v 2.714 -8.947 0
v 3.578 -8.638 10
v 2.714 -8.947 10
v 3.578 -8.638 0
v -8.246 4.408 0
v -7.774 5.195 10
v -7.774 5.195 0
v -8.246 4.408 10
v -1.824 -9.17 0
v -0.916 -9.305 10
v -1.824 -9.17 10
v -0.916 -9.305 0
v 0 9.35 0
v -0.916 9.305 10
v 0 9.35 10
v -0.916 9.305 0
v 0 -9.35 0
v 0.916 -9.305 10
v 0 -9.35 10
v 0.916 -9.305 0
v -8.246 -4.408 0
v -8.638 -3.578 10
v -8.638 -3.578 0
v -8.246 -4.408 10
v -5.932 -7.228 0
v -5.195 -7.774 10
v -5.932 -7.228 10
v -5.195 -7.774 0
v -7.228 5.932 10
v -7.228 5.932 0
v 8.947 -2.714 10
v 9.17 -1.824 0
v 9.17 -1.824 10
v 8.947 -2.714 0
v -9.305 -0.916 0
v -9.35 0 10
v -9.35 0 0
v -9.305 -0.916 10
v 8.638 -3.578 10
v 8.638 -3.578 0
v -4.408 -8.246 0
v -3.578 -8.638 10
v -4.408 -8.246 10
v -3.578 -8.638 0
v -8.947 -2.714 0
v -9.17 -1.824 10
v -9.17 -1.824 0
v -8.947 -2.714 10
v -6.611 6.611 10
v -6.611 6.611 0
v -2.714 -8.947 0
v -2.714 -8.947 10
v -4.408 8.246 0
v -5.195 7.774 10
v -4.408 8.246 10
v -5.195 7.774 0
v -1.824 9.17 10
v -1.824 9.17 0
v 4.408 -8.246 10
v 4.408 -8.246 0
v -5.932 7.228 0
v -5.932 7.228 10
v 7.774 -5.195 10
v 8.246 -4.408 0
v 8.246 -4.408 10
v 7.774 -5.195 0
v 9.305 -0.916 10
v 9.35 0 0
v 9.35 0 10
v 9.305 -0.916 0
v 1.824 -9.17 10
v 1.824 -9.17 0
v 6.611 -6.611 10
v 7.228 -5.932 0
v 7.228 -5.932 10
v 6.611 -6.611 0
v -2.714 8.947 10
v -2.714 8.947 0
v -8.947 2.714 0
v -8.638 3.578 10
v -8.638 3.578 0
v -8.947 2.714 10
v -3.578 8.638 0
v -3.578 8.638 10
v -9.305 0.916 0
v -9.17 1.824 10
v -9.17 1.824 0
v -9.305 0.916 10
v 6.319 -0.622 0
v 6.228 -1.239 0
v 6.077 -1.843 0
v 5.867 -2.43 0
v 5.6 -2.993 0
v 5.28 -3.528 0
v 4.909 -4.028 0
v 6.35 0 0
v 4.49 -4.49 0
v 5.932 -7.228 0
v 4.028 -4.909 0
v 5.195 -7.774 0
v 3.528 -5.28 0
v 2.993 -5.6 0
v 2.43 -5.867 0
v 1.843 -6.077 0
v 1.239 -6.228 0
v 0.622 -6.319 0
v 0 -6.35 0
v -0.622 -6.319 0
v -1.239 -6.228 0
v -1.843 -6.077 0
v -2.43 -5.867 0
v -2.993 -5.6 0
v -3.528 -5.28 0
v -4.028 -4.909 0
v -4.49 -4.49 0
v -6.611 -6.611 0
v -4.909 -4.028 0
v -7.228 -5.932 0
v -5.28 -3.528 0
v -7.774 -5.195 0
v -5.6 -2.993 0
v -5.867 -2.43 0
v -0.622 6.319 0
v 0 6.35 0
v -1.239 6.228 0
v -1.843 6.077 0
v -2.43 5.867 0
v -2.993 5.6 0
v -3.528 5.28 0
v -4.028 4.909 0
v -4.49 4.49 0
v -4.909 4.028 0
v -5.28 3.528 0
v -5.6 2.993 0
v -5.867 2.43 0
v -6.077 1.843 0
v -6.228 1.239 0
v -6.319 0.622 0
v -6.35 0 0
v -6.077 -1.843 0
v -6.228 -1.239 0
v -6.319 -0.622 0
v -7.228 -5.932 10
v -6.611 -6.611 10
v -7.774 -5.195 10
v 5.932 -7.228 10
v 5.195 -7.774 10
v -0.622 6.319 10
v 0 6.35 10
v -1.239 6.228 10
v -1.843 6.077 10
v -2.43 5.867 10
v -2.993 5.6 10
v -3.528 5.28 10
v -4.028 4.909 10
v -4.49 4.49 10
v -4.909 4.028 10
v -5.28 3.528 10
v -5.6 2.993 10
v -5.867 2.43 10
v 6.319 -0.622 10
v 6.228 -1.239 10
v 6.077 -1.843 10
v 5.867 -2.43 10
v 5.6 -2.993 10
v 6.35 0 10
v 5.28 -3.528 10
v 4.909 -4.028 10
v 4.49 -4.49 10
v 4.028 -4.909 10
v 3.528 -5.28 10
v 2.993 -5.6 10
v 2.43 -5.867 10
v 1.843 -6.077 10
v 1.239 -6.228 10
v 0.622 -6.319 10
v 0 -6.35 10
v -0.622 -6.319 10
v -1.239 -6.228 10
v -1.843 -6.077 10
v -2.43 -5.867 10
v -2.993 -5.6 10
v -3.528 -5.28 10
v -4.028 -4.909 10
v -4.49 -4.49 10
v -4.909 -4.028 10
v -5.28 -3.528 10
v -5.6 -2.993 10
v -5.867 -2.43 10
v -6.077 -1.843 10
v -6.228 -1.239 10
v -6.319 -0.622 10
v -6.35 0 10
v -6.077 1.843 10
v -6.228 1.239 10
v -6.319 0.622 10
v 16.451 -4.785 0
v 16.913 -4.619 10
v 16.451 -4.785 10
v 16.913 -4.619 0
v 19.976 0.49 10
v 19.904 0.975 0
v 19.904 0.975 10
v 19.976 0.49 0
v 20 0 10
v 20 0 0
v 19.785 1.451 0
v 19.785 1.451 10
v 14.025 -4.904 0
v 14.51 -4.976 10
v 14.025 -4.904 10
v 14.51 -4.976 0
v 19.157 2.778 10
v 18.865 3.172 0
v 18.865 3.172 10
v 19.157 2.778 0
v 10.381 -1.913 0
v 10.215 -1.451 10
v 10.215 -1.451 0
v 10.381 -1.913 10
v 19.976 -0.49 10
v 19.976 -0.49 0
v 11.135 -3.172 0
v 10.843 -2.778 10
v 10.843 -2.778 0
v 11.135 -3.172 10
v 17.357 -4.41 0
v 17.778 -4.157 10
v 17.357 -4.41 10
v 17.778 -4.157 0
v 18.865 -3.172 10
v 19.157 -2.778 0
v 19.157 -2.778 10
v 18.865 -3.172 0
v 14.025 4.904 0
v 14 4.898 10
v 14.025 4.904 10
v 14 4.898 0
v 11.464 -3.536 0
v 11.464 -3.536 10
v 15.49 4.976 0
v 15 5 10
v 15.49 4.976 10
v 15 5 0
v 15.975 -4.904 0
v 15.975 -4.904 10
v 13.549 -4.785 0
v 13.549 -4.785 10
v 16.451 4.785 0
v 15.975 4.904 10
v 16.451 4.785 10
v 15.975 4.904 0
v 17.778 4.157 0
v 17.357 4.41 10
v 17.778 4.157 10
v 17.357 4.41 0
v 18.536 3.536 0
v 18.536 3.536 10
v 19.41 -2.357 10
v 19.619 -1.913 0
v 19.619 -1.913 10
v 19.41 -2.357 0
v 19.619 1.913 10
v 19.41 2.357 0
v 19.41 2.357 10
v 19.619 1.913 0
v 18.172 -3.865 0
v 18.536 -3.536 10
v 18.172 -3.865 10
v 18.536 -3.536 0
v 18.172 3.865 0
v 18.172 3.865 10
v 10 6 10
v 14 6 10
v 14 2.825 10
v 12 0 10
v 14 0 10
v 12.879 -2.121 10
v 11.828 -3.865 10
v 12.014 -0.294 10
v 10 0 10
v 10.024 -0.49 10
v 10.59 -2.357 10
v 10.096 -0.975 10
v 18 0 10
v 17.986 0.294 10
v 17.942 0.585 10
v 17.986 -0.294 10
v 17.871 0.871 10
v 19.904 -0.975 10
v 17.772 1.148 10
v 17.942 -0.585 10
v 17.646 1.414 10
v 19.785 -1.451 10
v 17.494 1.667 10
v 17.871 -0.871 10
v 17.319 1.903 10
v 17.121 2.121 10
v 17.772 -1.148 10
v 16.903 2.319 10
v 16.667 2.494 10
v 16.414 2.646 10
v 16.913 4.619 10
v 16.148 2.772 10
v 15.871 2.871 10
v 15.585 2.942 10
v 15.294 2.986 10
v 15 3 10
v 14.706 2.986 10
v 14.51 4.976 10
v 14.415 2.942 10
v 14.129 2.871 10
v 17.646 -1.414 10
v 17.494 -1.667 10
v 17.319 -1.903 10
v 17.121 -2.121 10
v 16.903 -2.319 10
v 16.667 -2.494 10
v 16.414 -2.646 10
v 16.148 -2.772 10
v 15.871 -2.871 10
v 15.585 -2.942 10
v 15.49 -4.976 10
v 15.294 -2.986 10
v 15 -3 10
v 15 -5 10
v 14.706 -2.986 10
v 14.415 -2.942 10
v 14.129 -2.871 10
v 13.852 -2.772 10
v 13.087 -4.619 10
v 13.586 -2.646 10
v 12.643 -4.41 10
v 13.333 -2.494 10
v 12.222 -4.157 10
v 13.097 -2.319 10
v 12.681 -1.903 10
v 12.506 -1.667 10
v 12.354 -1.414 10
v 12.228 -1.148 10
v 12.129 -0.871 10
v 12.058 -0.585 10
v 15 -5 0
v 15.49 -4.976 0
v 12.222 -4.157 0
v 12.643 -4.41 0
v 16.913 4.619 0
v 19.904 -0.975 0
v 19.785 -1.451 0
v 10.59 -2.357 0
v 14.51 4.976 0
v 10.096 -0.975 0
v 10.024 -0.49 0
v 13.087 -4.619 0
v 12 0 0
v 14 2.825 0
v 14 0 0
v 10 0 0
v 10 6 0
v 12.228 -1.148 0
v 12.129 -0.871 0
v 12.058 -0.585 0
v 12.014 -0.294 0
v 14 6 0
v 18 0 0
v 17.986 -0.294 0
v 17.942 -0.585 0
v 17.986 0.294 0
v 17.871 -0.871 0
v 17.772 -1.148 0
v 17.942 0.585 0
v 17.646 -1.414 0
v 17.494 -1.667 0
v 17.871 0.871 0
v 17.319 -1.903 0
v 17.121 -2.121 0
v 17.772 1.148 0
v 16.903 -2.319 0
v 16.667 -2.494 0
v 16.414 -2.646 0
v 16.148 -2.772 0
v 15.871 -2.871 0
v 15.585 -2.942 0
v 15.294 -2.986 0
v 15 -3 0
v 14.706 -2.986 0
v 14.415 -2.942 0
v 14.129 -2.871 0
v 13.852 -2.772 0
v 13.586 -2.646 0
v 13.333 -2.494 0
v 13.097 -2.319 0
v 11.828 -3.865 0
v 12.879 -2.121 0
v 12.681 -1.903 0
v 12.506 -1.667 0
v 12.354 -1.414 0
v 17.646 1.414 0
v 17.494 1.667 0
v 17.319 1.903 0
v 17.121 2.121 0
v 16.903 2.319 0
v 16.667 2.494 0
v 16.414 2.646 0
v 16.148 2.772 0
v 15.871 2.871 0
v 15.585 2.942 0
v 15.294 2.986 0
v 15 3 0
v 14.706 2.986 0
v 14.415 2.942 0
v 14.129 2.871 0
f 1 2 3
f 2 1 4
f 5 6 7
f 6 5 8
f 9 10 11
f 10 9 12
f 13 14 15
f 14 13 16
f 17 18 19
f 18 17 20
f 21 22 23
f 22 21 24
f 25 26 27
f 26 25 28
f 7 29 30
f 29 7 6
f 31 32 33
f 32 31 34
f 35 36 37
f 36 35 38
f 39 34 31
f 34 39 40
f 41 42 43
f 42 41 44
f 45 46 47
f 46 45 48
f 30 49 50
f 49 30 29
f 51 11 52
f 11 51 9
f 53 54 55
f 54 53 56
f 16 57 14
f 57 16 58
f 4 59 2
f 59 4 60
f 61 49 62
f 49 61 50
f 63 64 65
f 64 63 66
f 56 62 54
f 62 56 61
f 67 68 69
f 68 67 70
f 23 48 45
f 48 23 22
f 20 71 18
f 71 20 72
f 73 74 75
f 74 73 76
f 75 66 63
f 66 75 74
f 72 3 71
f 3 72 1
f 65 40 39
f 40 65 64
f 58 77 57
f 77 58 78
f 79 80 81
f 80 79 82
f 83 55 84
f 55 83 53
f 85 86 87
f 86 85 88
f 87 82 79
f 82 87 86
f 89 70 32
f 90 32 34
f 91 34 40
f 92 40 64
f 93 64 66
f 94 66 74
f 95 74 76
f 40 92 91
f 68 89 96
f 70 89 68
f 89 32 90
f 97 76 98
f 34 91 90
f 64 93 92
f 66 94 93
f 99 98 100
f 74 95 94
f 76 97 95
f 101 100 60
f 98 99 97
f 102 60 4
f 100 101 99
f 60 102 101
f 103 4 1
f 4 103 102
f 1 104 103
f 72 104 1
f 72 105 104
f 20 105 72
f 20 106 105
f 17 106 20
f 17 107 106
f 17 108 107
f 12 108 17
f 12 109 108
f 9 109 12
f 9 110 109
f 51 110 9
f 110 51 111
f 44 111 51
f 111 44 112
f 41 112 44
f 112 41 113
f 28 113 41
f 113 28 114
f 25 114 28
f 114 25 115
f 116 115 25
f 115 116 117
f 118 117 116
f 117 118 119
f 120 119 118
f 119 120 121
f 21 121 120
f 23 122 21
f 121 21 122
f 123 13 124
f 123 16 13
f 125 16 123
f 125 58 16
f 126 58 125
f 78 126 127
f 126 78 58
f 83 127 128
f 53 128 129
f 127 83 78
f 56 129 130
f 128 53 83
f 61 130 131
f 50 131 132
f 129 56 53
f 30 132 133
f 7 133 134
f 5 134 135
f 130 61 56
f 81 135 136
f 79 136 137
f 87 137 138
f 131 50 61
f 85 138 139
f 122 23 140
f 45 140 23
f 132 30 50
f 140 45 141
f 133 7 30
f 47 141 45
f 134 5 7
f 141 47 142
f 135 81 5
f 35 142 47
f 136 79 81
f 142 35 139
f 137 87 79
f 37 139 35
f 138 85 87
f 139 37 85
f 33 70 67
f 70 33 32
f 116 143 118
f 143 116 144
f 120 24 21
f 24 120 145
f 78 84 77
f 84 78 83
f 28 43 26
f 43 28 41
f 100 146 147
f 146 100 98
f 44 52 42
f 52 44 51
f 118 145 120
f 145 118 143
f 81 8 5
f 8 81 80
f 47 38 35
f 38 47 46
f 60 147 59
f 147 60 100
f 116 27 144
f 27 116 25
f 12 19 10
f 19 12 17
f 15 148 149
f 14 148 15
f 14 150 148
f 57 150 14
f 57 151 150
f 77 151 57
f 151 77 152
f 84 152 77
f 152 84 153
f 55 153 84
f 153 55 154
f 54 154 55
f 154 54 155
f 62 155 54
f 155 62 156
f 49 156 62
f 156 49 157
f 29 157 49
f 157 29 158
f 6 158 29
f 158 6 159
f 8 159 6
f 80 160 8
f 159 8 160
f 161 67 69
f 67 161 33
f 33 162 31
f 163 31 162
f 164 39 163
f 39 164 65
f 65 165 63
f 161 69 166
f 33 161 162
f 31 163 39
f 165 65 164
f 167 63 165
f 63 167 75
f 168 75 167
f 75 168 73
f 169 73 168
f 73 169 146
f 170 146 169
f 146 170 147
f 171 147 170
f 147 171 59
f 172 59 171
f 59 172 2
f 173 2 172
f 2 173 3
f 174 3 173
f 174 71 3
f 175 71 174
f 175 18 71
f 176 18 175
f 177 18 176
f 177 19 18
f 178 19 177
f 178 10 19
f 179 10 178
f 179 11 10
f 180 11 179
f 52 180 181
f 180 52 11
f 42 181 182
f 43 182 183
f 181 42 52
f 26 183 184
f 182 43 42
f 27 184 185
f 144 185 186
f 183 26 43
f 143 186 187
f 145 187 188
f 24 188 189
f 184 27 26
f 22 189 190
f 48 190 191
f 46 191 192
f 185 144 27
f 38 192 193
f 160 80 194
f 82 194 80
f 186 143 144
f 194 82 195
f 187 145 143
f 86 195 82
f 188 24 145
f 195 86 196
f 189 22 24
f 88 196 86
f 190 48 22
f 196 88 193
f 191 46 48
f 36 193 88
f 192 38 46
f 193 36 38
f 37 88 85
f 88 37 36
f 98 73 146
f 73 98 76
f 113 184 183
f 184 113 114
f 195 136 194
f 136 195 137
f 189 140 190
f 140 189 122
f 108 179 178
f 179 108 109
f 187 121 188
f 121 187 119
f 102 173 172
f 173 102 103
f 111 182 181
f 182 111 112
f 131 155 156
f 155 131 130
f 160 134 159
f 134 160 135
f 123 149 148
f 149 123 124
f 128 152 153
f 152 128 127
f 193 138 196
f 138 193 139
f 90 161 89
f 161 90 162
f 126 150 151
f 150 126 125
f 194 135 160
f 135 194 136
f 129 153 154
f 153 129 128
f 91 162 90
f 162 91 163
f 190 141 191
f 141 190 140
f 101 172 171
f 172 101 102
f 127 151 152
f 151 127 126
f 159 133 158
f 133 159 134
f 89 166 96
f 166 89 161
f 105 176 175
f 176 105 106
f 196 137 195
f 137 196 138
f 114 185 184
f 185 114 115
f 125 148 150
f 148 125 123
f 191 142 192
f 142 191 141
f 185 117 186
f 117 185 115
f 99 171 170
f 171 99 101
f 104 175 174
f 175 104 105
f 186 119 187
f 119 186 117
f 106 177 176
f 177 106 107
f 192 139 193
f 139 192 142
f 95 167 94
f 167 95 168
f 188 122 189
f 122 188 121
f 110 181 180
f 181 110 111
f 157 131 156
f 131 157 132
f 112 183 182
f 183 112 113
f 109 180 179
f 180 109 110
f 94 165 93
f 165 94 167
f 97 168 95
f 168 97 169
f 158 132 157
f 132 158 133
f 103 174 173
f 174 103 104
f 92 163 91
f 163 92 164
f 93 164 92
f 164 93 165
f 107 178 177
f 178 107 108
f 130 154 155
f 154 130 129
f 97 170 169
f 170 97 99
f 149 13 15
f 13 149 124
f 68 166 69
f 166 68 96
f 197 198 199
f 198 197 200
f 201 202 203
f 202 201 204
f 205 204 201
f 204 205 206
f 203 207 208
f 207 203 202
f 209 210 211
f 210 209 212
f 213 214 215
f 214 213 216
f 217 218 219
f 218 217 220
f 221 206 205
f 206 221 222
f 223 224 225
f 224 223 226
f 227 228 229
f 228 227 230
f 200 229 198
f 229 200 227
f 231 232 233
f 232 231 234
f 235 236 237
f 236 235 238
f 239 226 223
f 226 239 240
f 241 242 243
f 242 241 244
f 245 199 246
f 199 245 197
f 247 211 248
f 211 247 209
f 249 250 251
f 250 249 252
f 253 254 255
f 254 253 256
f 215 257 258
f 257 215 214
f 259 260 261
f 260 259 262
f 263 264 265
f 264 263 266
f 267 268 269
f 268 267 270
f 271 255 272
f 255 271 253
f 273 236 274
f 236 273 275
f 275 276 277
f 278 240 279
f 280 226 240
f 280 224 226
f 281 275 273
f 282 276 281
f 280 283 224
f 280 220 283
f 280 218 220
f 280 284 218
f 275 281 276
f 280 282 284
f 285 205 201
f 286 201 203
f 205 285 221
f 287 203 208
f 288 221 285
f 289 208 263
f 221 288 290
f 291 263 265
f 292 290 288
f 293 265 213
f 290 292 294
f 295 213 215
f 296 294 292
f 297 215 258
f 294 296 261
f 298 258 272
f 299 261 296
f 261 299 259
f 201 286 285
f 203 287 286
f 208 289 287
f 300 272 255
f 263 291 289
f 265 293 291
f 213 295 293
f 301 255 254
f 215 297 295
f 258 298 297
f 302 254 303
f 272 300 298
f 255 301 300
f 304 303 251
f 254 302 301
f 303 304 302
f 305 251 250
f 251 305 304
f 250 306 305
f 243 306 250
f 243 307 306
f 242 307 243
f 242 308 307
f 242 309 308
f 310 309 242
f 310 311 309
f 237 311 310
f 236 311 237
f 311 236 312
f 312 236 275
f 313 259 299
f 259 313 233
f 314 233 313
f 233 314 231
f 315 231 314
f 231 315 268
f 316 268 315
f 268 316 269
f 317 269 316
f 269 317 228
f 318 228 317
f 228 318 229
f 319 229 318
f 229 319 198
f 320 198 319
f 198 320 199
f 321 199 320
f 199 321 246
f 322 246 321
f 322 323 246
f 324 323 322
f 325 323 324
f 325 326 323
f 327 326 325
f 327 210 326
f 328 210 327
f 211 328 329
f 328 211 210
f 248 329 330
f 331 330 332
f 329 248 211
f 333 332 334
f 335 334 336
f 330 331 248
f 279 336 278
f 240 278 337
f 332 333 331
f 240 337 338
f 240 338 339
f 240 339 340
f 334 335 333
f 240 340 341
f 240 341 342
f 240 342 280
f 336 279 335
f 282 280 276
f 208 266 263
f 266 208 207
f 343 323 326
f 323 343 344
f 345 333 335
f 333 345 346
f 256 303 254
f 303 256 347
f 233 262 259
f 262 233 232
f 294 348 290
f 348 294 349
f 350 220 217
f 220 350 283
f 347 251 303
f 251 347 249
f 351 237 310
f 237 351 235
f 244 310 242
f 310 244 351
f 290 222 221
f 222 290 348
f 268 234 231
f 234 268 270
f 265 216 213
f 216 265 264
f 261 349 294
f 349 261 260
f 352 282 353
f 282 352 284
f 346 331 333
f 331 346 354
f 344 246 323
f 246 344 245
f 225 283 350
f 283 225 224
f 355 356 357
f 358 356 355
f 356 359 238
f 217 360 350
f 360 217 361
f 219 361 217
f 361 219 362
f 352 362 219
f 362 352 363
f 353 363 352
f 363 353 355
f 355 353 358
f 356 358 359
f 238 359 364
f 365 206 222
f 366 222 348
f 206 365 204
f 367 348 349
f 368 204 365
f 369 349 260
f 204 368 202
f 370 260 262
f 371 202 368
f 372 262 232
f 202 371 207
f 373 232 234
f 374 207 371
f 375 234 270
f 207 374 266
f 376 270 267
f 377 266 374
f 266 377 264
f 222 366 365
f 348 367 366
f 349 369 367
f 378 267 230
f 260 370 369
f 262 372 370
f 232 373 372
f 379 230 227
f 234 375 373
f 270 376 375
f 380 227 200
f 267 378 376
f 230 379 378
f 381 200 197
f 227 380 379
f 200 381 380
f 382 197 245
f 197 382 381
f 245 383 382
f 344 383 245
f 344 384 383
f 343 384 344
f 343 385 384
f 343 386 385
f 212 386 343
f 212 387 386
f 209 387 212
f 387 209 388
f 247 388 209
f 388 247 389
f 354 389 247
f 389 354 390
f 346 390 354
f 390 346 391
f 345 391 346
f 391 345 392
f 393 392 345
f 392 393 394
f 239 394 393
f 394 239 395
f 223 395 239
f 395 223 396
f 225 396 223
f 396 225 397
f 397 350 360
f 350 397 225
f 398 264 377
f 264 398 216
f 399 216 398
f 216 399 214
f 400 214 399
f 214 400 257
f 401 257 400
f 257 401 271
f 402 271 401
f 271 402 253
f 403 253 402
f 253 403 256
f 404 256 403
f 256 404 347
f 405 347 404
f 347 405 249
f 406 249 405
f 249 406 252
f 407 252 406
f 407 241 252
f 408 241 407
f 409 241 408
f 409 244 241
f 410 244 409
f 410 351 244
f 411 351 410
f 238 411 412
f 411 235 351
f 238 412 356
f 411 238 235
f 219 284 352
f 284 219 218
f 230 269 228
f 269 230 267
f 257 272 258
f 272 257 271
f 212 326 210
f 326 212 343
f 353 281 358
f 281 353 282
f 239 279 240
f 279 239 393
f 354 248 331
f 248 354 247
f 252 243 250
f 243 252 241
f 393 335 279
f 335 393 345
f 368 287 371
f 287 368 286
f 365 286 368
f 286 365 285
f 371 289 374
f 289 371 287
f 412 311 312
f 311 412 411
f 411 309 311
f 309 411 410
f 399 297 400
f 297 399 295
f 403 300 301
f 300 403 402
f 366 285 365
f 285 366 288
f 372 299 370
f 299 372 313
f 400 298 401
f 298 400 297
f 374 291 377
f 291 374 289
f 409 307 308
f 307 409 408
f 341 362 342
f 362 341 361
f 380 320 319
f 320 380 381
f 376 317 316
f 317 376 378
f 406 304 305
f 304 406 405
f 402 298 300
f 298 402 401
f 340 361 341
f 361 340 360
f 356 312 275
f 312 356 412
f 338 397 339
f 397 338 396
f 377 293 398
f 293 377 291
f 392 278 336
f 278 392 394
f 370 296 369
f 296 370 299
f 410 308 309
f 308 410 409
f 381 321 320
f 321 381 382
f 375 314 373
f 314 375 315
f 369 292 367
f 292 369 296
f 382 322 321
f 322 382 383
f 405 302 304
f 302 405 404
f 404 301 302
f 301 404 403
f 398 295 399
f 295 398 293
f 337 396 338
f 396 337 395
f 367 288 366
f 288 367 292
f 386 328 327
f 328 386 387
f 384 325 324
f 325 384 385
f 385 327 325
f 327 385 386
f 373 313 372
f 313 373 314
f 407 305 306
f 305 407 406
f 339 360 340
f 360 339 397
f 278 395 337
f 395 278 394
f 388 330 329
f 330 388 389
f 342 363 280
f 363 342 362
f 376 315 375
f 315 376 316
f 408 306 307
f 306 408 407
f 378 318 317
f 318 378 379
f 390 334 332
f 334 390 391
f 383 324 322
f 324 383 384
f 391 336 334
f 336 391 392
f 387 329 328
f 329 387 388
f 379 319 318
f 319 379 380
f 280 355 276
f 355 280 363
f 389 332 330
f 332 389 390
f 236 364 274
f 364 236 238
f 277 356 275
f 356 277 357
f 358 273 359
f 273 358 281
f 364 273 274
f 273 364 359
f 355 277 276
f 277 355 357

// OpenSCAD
$fn = 64;

// Dimensions
rod_diameter = 12.7;           // Inner diameter of rod ring
rod_wall = 3;                 // Wall thickness of rod ring
rod_outer_diameter = rod_diameter + 2 * rod_wall; // 18.7 mm

tubing_inner_diameter = 6;     // Inner diameter of tubing ring
tubing_wall = 2;               // Wall thickness of tubing ring
tubing_outer_diameter = tubing_inner_diameter + 2 * tubing_wall; // 10 mm

bridge_width_y = 6;            // Width of bridge in Y direction
bridge_start_x = 8;            // Start X of bridge
bridge_end_x = 12;             // End X of bridge

// Rod ring: centered at origin, with -X side opening
rod_ring_inner_radius = rod_diameter / 2;
rod_ring_outer_radius = rod_outer_diameter / 2;

// Tubing ring: centered at (15, 0), with +X side opening
tubing_ring_center_x = 15;
tubing_ring_center_y = 0;
tubing_ring_inner_radius = tubing_inner_diameter / 2;
tubing_ring_outer_radius = tubing_outer_diameter / 2;

// Opening dimensions
rod_opening_width = 10;       // Width of opening in rod ring: -5 < y < 5
tubing_opening_width = 4.5; // Width of opening in tubing ring: -2.25 < y < 2.25

// Bridge: solid connection between rings
bridge_y_min = -bridge_width_y / 2;
bridge_y_max = bridge_width_y / 2;

// Ensure the entire part is printed flat on the bed (z = 0)
// The original model was centered at z = 0, but the bed is at z = -5.00
// We need to shift the whole model so that the lowest z is 0

// Adjust: move the entire model up by 5 mm so that z = 0 is the bed surface
// The original height was 10 mm (z from -5 to +5), now we want z from 0 to 10

// Build the clip with z offset of +5 mm
module clip() {
    // Start with rod ring
    difference() {
        // Outer ring (rod ring) - shifted up by 5 mm in z
        cylinder(r = rod_ring_outer_radius, h = 10, center = false);
        
        // Inner hole (rod ring)
        cylinder(r = rod_ring_inner_radius, h = 10.01, center = false);
        
        // Cut out rod ring opening: rectangle from x = -inf to x = 0, y = -5 to 5
        // Extend slightly beyond to ensure clean cut
        translate([0, 0, -0.01])
            cube([rod_ring_outer_radius * 2, rod_opening_width, 10.02], center = false);
    }

    // Add tubing ring (with its own opening)
    difference() {
        // Outer tubing ring - shifted up by 5 mm in z
        translate([tubing_ring_center_x, tubing_ring_center_y, 0])
            cylinder(r = tubing_ring_outer_radius, h = 10, center = false);
        
        // Inner hole of tubing ring
        translate([tubing_ring_center_x, tubing_ring_center_y, 0])
            cylinder(r = tubing_ring_inner_radius, h = 10.01, center = false);
        
        // Cut out tubing ring opening: rectangle from x = 15 to x = 15 + 4.5, y = -2.25 to 2.25
        translate([tubing_ring_center_x + tubing_ring_outer_radius, 0, -0.01])
            cube([tubing_opening_width + 0.1, tubing_opening_width, 10.02], center = false);
    }

    // Add bridge between rings
    // Bridge is a solid rectangle from x = 8 to 12, y = -3 to 3, z = 0 to 10
    translate([bridge_start_x + (bridge_end_x - bridge_start_x)/2, 0, 0])
        cube([bridge_end_x - bridge_start_x, bridge_width_y, 10], center = false);
}

// Render the clip, now correctly positioned at z = 0 to 10
clip();
